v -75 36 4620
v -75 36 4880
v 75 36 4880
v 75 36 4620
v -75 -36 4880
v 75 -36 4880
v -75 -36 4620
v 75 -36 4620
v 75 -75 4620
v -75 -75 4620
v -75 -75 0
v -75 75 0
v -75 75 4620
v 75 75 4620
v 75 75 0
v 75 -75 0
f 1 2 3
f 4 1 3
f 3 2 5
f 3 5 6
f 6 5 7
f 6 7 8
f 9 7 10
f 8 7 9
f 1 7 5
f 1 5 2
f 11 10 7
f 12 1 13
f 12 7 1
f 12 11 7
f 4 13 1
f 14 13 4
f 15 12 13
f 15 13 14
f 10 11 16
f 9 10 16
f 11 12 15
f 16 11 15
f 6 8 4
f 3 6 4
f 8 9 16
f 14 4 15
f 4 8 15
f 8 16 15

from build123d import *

# Parameters (mm, degrees)
F0_W     = 150
F0_H     = 150
F1_DEPTH = 4880
F2_W     = 150
F2_H     = 39
F3_DEPTH = 260
F4_DEPTH = 260


with BuildPart() as f1:
    # F0 (on Top) → F1 (new body)
    with BuildSketch(Plane.XY):
        Rectangle(F0_W, F0_H)
    extrude(amount=F1_DEPTH)

    # F2 (on face) → F3 (cut)
    with BuildSketch(Plane.XY.offset(4880)):
        with Locations((0, 55.5)):
            Rectangle(F2_W, F2_H)
        with Locations((0, -55.5)):
            Rectangle(F2_W, F2_H)
    extrude(amount=-F3_DEPTH, mode=Mode.SUBTRACT)

    # F2 (on face) → F4 (cut)
    with BuildSketch(Plane.XY.offset(4880)):
        with Locations((0, 55.5)):
            Rectangle(F2_W, F2_H)
    extrude(amount=-F4_DEPTH, mode=Mode.SUBTRACT)


solid = f1.part
